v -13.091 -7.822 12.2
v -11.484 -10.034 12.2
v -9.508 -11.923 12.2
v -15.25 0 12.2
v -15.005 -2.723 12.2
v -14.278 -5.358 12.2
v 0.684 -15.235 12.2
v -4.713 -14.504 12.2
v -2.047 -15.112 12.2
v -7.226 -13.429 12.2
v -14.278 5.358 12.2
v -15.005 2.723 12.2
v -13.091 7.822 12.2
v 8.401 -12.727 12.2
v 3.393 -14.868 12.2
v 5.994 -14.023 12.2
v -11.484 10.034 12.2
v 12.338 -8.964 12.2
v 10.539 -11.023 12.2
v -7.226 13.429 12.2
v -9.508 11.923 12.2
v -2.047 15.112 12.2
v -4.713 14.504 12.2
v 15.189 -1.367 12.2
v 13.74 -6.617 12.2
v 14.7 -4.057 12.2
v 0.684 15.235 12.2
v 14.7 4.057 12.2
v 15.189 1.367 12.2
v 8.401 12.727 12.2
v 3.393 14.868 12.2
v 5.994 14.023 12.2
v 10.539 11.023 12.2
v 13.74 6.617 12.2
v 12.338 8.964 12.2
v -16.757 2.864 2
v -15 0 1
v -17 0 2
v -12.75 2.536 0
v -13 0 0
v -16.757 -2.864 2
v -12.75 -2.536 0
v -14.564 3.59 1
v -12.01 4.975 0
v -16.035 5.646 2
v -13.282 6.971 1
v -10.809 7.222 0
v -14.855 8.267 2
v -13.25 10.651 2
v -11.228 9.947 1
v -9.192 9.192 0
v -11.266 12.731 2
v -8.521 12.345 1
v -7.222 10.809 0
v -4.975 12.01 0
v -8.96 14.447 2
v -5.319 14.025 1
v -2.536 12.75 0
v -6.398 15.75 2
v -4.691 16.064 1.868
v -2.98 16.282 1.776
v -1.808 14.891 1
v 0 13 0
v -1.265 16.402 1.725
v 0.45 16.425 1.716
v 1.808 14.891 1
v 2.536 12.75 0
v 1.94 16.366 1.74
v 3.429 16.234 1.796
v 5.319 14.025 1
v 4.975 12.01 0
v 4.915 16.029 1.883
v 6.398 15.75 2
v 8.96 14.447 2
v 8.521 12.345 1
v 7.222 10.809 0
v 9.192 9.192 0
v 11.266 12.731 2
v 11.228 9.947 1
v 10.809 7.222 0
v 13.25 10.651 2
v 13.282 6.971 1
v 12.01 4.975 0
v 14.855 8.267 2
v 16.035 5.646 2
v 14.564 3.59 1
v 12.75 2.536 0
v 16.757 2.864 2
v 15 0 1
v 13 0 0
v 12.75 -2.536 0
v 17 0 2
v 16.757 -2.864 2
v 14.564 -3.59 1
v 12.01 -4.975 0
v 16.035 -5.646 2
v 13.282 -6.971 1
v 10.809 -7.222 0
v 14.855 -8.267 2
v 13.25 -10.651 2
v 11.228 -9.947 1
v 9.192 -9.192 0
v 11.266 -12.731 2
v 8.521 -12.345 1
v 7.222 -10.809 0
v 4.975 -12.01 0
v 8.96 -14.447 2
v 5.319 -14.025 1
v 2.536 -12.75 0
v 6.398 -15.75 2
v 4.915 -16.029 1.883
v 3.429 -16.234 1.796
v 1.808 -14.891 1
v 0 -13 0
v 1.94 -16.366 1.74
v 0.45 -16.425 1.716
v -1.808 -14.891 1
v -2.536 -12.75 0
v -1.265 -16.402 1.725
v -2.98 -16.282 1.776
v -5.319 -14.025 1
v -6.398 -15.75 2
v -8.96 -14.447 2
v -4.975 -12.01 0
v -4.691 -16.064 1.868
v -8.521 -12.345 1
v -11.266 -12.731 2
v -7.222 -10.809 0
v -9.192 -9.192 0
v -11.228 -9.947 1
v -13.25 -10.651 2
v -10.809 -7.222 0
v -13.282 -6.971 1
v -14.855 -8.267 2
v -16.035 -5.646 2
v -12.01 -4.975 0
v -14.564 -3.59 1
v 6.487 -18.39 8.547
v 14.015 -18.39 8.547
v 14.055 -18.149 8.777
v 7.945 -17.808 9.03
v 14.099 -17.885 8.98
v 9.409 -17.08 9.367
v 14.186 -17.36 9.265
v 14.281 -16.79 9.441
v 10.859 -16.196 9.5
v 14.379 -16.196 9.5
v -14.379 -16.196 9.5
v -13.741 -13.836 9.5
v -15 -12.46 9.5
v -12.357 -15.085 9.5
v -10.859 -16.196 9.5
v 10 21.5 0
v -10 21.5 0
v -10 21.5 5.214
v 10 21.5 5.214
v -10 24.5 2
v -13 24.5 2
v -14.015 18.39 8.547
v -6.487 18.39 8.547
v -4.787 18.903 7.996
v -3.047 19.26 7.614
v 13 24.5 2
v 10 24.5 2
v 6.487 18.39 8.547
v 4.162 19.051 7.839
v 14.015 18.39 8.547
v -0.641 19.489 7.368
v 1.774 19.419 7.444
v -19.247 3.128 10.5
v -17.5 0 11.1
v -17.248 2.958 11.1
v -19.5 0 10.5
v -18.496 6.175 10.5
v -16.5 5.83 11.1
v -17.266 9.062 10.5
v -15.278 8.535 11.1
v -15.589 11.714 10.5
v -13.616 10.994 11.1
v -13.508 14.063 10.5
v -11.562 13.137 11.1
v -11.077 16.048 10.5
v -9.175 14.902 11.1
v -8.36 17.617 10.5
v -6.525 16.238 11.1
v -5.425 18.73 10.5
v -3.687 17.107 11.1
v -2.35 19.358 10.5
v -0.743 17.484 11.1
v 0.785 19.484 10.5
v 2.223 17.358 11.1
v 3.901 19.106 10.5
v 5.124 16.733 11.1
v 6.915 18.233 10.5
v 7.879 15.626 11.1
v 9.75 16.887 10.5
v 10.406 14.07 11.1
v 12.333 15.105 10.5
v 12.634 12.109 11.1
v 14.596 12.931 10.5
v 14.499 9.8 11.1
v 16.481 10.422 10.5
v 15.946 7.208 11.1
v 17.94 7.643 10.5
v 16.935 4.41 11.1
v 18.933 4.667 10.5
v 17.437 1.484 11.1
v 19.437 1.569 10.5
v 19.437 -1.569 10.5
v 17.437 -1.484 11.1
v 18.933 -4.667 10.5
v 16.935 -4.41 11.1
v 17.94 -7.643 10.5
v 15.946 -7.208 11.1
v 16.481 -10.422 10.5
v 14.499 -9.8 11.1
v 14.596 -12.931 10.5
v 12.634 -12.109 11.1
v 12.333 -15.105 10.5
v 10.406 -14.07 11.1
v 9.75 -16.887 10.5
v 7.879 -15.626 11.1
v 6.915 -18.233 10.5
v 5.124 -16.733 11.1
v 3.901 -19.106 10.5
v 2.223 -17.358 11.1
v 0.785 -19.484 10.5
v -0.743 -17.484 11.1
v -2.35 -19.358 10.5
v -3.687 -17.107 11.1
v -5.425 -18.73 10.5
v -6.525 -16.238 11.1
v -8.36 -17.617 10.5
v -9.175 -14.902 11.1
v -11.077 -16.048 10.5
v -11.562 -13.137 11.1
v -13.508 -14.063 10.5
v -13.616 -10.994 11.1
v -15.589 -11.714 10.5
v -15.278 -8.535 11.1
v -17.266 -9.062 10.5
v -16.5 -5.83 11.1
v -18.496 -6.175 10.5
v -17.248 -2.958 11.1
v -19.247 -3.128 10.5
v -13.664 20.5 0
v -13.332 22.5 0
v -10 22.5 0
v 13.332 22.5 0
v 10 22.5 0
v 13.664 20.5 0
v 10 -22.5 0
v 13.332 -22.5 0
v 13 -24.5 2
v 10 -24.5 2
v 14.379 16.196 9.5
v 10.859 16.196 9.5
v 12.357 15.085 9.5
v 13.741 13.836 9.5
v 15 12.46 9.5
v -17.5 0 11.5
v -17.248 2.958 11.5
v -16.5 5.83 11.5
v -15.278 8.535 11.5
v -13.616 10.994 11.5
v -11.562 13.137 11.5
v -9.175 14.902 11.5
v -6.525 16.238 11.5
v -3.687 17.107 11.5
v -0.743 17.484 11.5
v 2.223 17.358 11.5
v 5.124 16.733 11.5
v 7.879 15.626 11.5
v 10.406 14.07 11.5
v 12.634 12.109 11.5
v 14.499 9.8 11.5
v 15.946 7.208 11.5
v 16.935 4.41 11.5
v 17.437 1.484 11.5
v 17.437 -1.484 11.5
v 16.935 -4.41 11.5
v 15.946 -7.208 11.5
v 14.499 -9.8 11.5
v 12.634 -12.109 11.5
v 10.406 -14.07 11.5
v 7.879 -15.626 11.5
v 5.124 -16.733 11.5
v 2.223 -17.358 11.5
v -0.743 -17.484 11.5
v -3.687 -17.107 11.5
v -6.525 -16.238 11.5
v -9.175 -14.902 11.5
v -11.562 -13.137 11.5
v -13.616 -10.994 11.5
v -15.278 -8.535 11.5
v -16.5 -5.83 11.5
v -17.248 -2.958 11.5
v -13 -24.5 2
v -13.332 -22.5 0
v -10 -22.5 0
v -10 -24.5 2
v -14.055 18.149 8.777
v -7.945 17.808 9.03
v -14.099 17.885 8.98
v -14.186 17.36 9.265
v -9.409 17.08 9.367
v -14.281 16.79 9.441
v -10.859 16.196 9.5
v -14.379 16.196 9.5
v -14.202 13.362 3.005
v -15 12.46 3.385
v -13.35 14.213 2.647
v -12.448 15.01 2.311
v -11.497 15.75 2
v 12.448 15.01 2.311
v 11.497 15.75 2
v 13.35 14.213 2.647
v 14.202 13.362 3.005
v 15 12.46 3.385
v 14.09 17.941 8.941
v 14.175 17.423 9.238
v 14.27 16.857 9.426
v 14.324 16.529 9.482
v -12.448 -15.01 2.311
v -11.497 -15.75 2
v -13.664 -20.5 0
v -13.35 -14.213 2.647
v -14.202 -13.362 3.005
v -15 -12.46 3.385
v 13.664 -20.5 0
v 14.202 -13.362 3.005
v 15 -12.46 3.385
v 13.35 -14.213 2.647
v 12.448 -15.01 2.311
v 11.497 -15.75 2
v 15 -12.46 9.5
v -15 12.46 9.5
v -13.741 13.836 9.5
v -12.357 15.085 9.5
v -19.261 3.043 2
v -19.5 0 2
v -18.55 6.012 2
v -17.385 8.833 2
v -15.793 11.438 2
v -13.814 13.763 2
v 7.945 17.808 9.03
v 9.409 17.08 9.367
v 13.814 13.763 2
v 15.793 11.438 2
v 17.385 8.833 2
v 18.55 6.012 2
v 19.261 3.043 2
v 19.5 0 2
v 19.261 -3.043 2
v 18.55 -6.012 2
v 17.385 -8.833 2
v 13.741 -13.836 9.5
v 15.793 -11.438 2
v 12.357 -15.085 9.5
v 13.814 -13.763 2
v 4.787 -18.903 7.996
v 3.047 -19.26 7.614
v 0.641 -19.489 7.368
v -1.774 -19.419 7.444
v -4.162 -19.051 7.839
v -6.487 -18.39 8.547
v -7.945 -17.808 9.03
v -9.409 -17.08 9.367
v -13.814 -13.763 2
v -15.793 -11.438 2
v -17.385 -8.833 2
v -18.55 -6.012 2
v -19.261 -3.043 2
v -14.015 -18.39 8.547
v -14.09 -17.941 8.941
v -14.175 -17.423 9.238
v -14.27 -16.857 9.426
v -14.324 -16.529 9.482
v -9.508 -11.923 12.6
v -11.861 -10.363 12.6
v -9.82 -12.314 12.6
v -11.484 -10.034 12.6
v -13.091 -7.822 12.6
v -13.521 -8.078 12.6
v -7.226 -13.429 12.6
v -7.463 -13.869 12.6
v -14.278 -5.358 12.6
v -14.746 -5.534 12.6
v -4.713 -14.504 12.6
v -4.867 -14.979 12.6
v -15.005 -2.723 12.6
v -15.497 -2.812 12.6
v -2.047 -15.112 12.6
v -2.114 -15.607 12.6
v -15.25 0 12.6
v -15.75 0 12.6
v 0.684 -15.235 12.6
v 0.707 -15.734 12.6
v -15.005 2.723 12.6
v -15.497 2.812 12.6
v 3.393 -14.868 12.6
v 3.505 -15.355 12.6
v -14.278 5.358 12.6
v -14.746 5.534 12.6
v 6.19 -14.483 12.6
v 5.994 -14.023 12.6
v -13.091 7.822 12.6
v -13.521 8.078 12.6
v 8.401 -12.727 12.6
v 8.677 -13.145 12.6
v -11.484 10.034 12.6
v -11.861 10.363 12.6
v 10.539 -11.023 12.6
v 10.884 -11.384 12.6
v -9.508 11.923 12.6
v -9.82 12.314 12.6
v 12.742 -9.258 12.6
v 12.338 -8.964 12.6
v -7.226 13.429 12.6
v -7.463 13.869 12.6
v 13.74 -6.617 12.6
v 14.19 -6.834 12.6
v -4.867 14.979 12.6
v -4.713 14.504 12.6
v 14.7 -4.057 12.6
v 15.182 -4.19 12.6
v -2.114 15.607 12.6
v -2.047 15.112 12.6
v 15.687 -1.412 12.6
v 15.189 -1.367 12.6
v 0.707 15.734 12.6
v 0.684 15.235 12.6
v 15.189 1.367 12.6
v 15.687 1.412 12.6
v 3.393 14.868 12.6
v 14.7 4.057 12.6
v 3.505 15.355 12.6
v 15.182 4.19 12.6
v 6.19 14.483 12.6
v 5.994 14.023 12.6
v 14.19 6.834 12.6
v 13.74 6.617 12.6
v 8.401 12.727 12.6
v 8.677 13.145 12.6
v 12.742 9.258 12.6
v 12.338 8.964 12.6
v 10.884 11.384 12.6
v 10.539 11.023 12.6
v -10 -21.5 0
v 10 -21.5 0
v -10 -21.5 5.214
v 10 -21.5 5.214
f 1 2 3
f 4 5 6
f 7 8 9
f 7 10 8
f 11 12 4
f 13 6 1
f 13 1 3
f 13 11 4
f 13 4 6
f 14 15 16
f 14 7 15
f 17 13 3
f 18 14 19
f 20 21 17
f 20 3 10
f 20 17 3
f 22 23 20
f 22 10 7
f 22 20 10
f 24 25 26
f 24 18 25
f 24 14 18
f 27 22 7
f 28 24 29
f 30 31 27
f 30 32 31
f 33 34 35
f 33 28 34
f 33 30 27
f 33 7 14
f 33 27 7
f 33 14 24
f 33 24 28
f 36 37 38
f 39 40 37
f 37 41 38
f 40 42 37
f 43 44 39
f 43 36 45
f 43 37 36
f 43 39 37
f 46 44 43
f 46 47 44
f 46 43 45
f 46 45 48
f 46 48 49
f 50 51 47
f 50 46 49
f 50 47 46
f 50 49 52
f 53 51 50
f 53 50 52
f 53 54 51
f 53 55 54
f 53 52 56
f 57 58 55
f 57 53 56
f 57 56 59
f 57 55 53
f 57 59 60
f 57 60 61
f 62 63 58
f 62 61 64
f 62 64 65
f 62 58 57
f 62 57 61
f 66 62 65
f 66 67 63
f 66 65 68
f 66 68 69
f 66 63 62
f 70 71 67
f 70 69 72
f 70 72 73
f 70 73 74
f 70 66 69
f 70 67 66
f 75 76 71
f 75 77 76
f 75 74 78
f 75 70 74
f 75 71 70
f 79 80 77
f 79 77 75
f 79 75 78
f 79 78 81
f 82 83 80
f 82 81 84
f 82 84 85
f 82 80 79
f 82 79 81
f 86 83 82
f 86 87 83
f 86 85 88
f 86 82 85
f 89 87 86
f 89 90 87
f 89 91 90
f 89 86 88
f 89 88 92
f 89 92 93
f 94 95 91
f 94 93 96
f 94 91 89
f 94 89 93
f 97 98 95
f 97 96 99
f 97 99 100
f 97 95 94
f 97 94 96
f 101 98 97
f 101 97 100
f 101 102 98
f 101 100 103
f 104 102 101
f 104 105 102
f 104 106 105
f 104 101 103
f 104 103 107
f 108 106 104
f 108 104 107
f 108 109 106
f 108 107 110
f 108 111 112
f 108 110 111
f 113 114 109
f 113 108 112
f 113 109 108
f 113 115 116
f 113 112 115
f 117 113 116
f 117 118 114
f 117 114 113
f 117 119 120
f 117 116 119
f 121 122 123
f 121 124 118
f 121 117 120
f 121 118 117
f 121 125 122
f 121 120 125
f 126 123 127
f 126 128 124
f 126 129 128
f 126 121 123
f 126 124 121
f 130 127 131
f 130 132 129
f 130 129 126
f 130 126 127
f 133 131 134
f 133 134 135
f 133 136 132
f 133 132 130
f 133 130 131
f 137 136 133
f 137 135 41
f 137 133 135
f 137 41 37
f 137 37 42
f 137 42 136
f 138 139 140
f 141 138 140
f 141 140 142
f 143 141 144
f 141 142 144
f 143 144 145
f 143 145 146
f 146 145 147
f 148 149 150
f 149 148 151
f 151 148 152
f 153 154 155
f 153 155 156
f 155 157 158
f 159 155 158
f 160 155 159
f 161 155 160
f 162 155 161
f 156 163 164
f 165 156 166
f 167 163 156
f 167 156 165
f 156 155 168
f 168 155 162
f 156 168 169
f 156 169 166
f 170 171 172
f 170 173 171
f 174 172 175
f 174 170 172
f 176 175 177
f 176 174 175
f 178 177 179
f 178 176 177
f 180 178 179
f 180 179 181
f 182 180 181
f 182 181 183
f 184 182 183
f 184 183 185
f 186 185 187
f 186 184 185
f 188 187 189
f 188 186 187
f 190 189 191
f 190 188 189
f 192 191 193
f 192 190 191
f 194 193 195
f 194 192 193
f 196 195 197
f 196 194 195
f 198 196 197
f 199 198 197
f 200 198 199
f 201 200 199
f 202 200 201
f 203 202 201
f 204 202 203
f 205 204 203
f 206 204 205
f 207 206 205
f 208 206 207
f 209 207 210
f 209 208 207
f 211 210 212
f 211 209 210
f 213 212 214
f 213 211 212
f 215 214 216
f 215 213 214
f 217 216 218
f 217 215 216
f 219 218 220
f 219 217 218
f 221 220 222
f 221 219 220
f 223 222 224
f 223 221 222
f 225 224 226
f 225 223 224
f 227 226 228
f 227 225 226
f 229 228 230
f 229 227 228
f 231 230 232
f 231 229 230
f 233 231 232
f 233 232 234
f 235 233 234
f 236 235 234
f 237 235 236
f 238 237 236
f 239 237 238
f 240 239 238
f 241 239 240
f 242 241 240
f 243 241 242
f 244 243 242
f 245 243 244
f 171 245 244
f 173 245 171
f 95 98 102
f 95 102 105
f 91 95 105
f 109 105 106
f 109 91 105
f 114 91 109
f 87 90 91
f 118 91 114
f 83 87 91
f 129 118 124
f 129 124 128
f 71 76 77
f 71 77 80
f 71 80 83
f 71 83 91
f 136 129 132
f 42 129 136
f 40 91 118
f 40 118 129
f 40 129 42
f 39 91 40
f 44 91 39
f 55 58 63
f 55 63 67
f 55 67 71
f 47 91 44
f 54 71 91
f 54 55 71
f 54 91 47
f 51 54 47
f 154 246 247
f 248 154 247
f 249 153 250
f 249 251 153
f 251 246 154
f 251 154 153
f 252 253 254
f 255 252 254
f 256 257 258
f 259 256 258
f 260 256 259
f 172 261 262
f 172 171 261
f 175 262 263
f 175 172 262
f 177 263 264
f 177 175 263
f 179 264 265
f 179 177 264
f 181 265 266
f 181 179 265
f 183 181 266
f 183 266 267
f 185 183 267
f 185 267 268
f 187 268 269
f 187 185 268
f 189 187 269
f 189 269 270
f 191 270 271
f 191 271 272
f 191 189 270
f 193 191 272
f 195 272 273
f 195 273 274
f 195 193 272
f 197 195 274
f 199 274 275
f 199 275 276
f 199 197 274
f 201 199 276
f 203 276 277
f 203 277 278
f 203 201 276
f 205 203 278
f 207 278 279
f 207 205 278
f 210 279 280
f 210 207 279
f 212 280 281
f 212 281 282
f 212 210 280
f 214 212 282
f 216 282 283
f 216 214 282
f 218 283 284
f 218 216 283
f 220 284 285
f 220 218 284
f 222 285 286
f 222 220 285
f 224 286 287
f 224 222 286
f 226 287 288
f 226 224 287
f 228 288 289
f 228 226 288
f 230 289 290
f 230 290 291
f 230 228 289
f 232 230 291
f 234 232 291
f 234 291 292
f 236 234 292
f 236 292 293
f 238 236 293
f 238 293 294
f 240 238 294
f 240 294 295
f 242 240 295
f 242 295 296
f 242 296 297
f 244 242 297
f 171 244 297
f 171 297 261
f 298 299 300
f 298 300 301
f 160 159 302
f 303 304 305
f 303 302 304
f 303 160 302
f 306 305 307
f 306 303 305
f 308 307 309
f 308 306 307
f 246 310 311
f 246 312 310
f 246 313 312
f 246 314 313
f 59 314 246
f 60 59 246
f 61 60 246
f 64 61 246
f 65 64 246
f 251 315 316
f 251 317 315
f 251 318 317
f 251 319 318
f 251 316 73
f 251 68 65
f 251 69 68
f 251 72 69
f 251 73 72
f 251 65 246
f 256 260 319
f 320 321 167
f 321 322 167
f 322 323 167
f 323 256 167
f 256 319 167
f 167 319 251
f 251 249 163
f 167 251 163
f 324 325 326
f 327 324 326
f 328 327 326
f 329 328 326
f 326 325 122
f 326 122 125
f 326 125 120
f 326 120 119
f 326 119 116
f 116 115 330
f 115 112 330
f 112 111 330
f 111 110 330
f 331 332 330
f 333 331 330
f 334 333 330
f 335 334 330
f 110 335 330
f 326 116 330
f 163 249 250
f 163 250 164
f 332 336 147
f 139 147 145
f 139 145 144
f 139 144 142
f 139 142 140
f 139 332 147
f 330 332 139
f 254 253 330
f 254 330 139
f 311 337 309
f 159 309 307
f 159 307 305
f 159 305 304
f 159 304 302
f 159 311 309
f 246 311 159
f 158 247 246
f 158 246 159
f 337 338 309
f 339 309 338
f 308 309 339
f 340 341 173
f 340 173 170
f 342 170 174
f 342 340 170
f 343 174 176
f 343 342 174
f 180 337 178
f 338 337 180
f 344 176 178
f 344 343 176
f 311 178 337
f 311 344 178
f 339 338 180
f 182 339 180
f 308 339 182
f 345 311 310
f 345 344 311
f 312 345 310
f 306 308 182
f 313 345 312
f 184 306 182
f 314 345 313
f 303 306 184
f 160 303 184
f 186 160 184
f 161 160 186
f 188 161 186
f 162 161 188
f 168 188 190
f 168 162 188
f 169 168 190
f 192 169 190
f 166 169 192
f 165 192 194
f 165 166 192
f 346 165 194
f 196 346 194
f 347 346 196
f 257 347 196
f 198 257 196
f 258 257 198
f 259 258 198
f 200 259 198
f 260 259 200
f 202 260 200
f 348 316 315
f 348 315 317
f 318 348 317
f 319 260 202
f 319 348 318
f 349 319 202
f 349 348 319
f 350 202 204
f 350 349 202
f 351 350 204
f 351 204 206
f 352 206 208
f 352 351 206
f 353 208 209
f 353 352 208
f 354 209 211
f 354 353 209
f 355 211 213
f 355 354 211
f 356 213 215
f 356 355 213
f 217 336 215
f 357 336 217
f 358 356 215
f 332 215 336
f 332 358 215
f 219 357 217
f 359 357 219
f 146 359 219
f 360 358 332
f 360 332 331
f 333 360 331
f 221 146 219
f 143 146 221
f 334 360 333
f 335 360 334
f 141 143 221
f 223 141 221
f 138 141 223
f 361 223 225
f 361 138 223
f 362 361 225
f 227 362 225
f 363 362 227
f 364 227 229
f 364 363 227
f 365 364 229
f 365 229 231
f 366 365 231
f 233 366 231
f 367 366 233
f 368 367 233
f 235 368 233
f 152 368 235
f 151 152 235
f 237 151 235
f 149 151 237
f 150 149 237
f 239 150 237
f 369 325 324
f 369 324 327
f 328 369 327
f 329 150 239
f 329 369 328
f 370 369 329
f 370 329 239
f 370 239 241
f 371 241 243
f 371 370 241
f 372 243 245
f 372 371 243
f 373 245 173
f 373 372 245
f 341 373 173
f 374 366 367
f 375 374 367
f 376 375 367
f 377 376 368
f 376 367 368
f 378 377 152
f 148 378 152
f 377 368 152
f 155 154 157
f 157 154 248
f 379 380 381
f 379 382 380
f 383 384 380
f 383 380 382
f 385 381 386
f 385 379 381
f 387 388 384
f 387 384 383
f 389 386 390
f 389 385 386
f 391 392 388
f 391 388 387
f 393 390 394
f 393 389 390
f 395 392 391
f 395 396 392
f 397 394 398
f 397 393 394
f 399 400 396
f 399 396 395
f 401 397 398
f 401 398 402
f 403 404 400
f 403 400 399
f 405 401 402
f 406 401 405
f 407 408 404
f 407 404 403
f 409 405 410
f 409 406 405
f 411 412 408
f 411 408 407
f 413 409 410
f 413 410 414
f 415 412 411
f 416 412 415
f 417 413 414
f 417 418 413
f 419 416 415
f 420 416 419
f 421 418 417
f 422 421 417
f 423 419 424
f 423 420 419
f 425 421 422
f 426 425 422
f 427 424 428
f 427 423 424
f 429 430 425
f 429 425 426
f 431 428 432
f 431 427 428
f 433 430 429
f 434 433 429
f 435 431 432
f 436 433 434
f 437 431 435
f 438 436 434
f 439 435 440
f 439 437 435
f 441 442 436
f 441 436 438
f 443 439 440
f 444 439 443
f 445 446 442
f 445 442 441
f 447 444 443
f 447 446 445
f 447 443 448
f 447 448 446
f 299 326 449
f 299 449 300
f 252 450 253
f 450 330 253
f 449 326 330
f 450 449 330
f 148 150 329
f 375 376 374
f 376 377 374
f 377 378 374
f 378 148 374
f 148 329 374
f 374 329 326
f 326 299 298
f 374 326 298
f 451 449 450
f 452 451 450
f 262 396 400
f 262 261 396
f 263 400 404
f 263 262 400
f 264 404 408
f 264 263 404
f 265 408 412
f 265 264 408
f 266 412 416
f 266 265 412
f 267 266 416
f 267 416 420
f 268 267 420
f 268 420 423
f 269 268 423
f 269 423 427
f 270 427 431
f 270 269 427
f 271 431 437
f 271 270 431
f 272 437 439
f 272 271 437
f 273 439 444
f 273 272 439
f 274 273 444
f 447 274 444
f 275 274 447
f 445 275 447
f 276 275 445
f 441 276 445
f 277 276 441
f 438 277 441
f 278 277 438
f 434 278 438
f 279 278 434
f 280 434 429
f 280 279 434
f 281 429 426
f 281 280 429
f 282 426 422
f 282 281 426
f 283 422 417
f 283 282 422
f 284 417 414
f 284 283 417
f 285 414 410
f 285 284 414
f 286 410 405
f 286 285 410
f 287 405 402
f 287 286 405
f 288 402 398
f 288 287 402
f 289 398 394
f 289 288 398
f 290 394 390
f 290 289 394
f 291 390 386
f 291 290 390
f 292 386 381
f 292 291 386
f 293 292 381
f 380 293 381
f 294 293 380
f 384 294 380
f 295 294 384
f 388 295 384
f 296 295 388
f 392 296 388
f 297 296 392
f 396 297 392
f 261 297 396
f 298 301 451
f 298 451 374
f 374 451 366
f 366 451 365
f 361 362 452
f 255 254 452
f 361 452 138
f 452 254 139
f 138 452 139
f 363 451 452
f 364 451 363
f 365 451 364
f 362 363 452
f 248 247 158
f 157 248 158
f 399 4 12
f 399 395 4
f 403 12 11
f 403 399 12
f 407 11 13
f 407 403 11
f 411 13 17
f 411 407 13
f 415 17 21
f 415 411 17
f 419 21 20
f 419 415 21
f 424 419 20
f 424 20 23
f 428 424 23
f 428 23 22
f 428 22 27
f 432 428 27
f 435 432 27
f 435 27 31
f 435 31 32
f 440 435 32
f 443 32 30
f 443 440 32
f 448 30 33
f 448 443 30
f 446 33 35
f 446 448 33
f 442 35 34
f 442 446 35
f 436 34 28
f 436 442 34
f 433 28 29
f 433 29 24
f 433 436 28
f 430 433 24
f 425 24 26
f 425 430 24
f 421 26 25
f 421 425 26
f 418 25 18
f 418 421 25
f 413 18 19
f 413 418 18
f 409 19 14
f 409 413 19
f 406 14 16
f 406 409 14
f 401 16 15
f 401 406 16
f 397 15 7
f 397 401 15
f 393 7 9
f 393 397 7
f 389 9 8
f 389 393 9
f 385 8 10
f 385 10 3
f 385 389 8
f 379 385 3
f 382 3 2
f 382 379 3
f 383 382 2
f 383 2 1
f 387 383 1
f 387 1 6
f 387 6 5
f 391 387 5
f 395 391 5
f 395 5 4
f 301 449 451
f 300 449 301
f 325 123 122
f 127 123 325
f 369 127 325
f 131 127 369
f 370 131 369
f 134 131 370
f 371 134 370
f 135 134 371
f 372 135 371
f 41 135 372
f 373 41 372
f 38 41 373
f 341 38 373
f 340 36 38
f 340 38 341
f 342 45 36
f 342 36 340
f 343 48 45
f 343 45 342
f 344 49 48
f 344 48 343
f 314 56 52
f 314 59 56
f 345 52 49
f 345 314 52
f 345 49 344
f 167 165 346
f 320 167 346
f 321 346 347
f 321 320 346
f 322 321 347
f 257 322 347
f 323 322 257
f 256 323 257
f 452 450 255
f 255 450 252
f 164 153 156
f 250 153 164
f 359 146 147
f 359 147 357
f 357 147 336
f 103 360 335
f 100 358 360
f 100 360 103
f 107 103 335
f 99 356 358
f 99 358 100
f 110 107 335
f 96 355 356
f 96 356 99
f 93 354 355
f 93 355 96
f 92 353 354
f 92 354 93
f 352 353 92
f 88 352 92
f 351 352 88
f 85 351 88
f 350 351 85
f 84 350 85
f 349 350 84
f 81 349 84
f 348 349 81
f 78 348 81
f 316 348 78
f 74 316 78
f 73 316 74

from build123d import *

# Parameters (mm, degrees)
F3_DEPTH         = 15
F5_DEPTH         = 12.601
F5_COPIES2_COUNT = 2
F6_W             = 20
F6_H             = 3
F7_DEPTH         = 12.601


# Not quite as in the source:
# - a pattern or mirror of a feature is missing from the dataset's text; its kind, count and spacing are read off the source's solid


with BuildPart() as f1:
    # F0 (on Front) → F1 (revolve)
    with BuildSketch(Plane.XZ):
        Polygon((-13, 0), (0, 0), (0, 12.2), (-15.25, 12.2), (-15.25, 12.6), (-15.75, 12.6), (-17.5, 11.5), (-17.5, 11.1), (-19.5, 10.5), (-19.5, 2), (-17, 2), align=None)
    revolve(axis=Axis((0, 0, 3.4052523688), (0, 0, -1)))

    # F2 (on Right) → F3 (join, symmetric)
    with BuildSketch(Plane.YZ):
        with BuildLine():
            Line((20.5, 0), (22.5, 0))
            Line((22.5, 0), (24.5, 2))
            Line((24.5, 2), (18.389508899, 8.5469547511))
            ThreePointArc((18.389508899, 8.5469547511), (17.3919884737, 9.2514418269), (16.1963430943, 9.5))
            Line((16.1963430943, 9.5), (11, 9.5))
            Line((11, 9.5), (11, 4))
            Line((11, 4), (20.5, 0))
        make_face()
    f3 = extrude(amount=F3_DEPTH, both=True)

    # F3_copies: F3 across plane
    add(f3.mirror(Plane(origin=(0, 0, 0), x_dir=(0, 0, -1), z_dir=(0, -1, 0))))

    # F4 (on Top) → F5 (cut, through all)
    with BuildSketch(Plane.XY):
        Polygon((-15, 24.5), (-15, 12.4599357944), (-13, 24.5), align=None)
    f5 = extrude(amount=F5_DEPTH, mode=Mode.SUBTRACT)

    # F5_copies: F5 across plane
    add(f5.mirror(Plane(origin=(0, 0, 0), x_dir=(0, 0, 1), z_dir=(1, 0, 0))), mode=Mode.SUBTRACT)

    # F5_copies1: F5 across plane
    add(f5.mirror(Plane(origin=(0, 0, 0), x_dir=(0, 0, -1), z_dir=(0, -1, 0))), mode=Mode.SUBTRACT)

    # F5_copies2: F5 ×2 about axis
    f5_copies2_axis = Axis((0, 0, 0), (0, 0, 1))
    for i in range(1, F5_COPIES2_COUNT):
        add(f5.rotate(f5_copies2_axis, i * 360 / F5_COPIES2_COUNT), mode=Mode.SUBTRACT)

    # F6 (on Top) → F7 (cut, through all)
    with BuildSketch(Plane.XY):
        with Locations((0, 23)):
            Rectangle(F6_W, F6_H)
    f7 = extrude(amount=F7_DEPTH, mode=Mode.SUBTRACT)

    # F7_copies: F7 across plane
    add(f7.mirror(Plane(origin=(0, 0, 0), x_dir=(0, 0, -1), z_dir=(0, -1, 0))), mode=Mode.SUBTRACT)


solid = f1.part
